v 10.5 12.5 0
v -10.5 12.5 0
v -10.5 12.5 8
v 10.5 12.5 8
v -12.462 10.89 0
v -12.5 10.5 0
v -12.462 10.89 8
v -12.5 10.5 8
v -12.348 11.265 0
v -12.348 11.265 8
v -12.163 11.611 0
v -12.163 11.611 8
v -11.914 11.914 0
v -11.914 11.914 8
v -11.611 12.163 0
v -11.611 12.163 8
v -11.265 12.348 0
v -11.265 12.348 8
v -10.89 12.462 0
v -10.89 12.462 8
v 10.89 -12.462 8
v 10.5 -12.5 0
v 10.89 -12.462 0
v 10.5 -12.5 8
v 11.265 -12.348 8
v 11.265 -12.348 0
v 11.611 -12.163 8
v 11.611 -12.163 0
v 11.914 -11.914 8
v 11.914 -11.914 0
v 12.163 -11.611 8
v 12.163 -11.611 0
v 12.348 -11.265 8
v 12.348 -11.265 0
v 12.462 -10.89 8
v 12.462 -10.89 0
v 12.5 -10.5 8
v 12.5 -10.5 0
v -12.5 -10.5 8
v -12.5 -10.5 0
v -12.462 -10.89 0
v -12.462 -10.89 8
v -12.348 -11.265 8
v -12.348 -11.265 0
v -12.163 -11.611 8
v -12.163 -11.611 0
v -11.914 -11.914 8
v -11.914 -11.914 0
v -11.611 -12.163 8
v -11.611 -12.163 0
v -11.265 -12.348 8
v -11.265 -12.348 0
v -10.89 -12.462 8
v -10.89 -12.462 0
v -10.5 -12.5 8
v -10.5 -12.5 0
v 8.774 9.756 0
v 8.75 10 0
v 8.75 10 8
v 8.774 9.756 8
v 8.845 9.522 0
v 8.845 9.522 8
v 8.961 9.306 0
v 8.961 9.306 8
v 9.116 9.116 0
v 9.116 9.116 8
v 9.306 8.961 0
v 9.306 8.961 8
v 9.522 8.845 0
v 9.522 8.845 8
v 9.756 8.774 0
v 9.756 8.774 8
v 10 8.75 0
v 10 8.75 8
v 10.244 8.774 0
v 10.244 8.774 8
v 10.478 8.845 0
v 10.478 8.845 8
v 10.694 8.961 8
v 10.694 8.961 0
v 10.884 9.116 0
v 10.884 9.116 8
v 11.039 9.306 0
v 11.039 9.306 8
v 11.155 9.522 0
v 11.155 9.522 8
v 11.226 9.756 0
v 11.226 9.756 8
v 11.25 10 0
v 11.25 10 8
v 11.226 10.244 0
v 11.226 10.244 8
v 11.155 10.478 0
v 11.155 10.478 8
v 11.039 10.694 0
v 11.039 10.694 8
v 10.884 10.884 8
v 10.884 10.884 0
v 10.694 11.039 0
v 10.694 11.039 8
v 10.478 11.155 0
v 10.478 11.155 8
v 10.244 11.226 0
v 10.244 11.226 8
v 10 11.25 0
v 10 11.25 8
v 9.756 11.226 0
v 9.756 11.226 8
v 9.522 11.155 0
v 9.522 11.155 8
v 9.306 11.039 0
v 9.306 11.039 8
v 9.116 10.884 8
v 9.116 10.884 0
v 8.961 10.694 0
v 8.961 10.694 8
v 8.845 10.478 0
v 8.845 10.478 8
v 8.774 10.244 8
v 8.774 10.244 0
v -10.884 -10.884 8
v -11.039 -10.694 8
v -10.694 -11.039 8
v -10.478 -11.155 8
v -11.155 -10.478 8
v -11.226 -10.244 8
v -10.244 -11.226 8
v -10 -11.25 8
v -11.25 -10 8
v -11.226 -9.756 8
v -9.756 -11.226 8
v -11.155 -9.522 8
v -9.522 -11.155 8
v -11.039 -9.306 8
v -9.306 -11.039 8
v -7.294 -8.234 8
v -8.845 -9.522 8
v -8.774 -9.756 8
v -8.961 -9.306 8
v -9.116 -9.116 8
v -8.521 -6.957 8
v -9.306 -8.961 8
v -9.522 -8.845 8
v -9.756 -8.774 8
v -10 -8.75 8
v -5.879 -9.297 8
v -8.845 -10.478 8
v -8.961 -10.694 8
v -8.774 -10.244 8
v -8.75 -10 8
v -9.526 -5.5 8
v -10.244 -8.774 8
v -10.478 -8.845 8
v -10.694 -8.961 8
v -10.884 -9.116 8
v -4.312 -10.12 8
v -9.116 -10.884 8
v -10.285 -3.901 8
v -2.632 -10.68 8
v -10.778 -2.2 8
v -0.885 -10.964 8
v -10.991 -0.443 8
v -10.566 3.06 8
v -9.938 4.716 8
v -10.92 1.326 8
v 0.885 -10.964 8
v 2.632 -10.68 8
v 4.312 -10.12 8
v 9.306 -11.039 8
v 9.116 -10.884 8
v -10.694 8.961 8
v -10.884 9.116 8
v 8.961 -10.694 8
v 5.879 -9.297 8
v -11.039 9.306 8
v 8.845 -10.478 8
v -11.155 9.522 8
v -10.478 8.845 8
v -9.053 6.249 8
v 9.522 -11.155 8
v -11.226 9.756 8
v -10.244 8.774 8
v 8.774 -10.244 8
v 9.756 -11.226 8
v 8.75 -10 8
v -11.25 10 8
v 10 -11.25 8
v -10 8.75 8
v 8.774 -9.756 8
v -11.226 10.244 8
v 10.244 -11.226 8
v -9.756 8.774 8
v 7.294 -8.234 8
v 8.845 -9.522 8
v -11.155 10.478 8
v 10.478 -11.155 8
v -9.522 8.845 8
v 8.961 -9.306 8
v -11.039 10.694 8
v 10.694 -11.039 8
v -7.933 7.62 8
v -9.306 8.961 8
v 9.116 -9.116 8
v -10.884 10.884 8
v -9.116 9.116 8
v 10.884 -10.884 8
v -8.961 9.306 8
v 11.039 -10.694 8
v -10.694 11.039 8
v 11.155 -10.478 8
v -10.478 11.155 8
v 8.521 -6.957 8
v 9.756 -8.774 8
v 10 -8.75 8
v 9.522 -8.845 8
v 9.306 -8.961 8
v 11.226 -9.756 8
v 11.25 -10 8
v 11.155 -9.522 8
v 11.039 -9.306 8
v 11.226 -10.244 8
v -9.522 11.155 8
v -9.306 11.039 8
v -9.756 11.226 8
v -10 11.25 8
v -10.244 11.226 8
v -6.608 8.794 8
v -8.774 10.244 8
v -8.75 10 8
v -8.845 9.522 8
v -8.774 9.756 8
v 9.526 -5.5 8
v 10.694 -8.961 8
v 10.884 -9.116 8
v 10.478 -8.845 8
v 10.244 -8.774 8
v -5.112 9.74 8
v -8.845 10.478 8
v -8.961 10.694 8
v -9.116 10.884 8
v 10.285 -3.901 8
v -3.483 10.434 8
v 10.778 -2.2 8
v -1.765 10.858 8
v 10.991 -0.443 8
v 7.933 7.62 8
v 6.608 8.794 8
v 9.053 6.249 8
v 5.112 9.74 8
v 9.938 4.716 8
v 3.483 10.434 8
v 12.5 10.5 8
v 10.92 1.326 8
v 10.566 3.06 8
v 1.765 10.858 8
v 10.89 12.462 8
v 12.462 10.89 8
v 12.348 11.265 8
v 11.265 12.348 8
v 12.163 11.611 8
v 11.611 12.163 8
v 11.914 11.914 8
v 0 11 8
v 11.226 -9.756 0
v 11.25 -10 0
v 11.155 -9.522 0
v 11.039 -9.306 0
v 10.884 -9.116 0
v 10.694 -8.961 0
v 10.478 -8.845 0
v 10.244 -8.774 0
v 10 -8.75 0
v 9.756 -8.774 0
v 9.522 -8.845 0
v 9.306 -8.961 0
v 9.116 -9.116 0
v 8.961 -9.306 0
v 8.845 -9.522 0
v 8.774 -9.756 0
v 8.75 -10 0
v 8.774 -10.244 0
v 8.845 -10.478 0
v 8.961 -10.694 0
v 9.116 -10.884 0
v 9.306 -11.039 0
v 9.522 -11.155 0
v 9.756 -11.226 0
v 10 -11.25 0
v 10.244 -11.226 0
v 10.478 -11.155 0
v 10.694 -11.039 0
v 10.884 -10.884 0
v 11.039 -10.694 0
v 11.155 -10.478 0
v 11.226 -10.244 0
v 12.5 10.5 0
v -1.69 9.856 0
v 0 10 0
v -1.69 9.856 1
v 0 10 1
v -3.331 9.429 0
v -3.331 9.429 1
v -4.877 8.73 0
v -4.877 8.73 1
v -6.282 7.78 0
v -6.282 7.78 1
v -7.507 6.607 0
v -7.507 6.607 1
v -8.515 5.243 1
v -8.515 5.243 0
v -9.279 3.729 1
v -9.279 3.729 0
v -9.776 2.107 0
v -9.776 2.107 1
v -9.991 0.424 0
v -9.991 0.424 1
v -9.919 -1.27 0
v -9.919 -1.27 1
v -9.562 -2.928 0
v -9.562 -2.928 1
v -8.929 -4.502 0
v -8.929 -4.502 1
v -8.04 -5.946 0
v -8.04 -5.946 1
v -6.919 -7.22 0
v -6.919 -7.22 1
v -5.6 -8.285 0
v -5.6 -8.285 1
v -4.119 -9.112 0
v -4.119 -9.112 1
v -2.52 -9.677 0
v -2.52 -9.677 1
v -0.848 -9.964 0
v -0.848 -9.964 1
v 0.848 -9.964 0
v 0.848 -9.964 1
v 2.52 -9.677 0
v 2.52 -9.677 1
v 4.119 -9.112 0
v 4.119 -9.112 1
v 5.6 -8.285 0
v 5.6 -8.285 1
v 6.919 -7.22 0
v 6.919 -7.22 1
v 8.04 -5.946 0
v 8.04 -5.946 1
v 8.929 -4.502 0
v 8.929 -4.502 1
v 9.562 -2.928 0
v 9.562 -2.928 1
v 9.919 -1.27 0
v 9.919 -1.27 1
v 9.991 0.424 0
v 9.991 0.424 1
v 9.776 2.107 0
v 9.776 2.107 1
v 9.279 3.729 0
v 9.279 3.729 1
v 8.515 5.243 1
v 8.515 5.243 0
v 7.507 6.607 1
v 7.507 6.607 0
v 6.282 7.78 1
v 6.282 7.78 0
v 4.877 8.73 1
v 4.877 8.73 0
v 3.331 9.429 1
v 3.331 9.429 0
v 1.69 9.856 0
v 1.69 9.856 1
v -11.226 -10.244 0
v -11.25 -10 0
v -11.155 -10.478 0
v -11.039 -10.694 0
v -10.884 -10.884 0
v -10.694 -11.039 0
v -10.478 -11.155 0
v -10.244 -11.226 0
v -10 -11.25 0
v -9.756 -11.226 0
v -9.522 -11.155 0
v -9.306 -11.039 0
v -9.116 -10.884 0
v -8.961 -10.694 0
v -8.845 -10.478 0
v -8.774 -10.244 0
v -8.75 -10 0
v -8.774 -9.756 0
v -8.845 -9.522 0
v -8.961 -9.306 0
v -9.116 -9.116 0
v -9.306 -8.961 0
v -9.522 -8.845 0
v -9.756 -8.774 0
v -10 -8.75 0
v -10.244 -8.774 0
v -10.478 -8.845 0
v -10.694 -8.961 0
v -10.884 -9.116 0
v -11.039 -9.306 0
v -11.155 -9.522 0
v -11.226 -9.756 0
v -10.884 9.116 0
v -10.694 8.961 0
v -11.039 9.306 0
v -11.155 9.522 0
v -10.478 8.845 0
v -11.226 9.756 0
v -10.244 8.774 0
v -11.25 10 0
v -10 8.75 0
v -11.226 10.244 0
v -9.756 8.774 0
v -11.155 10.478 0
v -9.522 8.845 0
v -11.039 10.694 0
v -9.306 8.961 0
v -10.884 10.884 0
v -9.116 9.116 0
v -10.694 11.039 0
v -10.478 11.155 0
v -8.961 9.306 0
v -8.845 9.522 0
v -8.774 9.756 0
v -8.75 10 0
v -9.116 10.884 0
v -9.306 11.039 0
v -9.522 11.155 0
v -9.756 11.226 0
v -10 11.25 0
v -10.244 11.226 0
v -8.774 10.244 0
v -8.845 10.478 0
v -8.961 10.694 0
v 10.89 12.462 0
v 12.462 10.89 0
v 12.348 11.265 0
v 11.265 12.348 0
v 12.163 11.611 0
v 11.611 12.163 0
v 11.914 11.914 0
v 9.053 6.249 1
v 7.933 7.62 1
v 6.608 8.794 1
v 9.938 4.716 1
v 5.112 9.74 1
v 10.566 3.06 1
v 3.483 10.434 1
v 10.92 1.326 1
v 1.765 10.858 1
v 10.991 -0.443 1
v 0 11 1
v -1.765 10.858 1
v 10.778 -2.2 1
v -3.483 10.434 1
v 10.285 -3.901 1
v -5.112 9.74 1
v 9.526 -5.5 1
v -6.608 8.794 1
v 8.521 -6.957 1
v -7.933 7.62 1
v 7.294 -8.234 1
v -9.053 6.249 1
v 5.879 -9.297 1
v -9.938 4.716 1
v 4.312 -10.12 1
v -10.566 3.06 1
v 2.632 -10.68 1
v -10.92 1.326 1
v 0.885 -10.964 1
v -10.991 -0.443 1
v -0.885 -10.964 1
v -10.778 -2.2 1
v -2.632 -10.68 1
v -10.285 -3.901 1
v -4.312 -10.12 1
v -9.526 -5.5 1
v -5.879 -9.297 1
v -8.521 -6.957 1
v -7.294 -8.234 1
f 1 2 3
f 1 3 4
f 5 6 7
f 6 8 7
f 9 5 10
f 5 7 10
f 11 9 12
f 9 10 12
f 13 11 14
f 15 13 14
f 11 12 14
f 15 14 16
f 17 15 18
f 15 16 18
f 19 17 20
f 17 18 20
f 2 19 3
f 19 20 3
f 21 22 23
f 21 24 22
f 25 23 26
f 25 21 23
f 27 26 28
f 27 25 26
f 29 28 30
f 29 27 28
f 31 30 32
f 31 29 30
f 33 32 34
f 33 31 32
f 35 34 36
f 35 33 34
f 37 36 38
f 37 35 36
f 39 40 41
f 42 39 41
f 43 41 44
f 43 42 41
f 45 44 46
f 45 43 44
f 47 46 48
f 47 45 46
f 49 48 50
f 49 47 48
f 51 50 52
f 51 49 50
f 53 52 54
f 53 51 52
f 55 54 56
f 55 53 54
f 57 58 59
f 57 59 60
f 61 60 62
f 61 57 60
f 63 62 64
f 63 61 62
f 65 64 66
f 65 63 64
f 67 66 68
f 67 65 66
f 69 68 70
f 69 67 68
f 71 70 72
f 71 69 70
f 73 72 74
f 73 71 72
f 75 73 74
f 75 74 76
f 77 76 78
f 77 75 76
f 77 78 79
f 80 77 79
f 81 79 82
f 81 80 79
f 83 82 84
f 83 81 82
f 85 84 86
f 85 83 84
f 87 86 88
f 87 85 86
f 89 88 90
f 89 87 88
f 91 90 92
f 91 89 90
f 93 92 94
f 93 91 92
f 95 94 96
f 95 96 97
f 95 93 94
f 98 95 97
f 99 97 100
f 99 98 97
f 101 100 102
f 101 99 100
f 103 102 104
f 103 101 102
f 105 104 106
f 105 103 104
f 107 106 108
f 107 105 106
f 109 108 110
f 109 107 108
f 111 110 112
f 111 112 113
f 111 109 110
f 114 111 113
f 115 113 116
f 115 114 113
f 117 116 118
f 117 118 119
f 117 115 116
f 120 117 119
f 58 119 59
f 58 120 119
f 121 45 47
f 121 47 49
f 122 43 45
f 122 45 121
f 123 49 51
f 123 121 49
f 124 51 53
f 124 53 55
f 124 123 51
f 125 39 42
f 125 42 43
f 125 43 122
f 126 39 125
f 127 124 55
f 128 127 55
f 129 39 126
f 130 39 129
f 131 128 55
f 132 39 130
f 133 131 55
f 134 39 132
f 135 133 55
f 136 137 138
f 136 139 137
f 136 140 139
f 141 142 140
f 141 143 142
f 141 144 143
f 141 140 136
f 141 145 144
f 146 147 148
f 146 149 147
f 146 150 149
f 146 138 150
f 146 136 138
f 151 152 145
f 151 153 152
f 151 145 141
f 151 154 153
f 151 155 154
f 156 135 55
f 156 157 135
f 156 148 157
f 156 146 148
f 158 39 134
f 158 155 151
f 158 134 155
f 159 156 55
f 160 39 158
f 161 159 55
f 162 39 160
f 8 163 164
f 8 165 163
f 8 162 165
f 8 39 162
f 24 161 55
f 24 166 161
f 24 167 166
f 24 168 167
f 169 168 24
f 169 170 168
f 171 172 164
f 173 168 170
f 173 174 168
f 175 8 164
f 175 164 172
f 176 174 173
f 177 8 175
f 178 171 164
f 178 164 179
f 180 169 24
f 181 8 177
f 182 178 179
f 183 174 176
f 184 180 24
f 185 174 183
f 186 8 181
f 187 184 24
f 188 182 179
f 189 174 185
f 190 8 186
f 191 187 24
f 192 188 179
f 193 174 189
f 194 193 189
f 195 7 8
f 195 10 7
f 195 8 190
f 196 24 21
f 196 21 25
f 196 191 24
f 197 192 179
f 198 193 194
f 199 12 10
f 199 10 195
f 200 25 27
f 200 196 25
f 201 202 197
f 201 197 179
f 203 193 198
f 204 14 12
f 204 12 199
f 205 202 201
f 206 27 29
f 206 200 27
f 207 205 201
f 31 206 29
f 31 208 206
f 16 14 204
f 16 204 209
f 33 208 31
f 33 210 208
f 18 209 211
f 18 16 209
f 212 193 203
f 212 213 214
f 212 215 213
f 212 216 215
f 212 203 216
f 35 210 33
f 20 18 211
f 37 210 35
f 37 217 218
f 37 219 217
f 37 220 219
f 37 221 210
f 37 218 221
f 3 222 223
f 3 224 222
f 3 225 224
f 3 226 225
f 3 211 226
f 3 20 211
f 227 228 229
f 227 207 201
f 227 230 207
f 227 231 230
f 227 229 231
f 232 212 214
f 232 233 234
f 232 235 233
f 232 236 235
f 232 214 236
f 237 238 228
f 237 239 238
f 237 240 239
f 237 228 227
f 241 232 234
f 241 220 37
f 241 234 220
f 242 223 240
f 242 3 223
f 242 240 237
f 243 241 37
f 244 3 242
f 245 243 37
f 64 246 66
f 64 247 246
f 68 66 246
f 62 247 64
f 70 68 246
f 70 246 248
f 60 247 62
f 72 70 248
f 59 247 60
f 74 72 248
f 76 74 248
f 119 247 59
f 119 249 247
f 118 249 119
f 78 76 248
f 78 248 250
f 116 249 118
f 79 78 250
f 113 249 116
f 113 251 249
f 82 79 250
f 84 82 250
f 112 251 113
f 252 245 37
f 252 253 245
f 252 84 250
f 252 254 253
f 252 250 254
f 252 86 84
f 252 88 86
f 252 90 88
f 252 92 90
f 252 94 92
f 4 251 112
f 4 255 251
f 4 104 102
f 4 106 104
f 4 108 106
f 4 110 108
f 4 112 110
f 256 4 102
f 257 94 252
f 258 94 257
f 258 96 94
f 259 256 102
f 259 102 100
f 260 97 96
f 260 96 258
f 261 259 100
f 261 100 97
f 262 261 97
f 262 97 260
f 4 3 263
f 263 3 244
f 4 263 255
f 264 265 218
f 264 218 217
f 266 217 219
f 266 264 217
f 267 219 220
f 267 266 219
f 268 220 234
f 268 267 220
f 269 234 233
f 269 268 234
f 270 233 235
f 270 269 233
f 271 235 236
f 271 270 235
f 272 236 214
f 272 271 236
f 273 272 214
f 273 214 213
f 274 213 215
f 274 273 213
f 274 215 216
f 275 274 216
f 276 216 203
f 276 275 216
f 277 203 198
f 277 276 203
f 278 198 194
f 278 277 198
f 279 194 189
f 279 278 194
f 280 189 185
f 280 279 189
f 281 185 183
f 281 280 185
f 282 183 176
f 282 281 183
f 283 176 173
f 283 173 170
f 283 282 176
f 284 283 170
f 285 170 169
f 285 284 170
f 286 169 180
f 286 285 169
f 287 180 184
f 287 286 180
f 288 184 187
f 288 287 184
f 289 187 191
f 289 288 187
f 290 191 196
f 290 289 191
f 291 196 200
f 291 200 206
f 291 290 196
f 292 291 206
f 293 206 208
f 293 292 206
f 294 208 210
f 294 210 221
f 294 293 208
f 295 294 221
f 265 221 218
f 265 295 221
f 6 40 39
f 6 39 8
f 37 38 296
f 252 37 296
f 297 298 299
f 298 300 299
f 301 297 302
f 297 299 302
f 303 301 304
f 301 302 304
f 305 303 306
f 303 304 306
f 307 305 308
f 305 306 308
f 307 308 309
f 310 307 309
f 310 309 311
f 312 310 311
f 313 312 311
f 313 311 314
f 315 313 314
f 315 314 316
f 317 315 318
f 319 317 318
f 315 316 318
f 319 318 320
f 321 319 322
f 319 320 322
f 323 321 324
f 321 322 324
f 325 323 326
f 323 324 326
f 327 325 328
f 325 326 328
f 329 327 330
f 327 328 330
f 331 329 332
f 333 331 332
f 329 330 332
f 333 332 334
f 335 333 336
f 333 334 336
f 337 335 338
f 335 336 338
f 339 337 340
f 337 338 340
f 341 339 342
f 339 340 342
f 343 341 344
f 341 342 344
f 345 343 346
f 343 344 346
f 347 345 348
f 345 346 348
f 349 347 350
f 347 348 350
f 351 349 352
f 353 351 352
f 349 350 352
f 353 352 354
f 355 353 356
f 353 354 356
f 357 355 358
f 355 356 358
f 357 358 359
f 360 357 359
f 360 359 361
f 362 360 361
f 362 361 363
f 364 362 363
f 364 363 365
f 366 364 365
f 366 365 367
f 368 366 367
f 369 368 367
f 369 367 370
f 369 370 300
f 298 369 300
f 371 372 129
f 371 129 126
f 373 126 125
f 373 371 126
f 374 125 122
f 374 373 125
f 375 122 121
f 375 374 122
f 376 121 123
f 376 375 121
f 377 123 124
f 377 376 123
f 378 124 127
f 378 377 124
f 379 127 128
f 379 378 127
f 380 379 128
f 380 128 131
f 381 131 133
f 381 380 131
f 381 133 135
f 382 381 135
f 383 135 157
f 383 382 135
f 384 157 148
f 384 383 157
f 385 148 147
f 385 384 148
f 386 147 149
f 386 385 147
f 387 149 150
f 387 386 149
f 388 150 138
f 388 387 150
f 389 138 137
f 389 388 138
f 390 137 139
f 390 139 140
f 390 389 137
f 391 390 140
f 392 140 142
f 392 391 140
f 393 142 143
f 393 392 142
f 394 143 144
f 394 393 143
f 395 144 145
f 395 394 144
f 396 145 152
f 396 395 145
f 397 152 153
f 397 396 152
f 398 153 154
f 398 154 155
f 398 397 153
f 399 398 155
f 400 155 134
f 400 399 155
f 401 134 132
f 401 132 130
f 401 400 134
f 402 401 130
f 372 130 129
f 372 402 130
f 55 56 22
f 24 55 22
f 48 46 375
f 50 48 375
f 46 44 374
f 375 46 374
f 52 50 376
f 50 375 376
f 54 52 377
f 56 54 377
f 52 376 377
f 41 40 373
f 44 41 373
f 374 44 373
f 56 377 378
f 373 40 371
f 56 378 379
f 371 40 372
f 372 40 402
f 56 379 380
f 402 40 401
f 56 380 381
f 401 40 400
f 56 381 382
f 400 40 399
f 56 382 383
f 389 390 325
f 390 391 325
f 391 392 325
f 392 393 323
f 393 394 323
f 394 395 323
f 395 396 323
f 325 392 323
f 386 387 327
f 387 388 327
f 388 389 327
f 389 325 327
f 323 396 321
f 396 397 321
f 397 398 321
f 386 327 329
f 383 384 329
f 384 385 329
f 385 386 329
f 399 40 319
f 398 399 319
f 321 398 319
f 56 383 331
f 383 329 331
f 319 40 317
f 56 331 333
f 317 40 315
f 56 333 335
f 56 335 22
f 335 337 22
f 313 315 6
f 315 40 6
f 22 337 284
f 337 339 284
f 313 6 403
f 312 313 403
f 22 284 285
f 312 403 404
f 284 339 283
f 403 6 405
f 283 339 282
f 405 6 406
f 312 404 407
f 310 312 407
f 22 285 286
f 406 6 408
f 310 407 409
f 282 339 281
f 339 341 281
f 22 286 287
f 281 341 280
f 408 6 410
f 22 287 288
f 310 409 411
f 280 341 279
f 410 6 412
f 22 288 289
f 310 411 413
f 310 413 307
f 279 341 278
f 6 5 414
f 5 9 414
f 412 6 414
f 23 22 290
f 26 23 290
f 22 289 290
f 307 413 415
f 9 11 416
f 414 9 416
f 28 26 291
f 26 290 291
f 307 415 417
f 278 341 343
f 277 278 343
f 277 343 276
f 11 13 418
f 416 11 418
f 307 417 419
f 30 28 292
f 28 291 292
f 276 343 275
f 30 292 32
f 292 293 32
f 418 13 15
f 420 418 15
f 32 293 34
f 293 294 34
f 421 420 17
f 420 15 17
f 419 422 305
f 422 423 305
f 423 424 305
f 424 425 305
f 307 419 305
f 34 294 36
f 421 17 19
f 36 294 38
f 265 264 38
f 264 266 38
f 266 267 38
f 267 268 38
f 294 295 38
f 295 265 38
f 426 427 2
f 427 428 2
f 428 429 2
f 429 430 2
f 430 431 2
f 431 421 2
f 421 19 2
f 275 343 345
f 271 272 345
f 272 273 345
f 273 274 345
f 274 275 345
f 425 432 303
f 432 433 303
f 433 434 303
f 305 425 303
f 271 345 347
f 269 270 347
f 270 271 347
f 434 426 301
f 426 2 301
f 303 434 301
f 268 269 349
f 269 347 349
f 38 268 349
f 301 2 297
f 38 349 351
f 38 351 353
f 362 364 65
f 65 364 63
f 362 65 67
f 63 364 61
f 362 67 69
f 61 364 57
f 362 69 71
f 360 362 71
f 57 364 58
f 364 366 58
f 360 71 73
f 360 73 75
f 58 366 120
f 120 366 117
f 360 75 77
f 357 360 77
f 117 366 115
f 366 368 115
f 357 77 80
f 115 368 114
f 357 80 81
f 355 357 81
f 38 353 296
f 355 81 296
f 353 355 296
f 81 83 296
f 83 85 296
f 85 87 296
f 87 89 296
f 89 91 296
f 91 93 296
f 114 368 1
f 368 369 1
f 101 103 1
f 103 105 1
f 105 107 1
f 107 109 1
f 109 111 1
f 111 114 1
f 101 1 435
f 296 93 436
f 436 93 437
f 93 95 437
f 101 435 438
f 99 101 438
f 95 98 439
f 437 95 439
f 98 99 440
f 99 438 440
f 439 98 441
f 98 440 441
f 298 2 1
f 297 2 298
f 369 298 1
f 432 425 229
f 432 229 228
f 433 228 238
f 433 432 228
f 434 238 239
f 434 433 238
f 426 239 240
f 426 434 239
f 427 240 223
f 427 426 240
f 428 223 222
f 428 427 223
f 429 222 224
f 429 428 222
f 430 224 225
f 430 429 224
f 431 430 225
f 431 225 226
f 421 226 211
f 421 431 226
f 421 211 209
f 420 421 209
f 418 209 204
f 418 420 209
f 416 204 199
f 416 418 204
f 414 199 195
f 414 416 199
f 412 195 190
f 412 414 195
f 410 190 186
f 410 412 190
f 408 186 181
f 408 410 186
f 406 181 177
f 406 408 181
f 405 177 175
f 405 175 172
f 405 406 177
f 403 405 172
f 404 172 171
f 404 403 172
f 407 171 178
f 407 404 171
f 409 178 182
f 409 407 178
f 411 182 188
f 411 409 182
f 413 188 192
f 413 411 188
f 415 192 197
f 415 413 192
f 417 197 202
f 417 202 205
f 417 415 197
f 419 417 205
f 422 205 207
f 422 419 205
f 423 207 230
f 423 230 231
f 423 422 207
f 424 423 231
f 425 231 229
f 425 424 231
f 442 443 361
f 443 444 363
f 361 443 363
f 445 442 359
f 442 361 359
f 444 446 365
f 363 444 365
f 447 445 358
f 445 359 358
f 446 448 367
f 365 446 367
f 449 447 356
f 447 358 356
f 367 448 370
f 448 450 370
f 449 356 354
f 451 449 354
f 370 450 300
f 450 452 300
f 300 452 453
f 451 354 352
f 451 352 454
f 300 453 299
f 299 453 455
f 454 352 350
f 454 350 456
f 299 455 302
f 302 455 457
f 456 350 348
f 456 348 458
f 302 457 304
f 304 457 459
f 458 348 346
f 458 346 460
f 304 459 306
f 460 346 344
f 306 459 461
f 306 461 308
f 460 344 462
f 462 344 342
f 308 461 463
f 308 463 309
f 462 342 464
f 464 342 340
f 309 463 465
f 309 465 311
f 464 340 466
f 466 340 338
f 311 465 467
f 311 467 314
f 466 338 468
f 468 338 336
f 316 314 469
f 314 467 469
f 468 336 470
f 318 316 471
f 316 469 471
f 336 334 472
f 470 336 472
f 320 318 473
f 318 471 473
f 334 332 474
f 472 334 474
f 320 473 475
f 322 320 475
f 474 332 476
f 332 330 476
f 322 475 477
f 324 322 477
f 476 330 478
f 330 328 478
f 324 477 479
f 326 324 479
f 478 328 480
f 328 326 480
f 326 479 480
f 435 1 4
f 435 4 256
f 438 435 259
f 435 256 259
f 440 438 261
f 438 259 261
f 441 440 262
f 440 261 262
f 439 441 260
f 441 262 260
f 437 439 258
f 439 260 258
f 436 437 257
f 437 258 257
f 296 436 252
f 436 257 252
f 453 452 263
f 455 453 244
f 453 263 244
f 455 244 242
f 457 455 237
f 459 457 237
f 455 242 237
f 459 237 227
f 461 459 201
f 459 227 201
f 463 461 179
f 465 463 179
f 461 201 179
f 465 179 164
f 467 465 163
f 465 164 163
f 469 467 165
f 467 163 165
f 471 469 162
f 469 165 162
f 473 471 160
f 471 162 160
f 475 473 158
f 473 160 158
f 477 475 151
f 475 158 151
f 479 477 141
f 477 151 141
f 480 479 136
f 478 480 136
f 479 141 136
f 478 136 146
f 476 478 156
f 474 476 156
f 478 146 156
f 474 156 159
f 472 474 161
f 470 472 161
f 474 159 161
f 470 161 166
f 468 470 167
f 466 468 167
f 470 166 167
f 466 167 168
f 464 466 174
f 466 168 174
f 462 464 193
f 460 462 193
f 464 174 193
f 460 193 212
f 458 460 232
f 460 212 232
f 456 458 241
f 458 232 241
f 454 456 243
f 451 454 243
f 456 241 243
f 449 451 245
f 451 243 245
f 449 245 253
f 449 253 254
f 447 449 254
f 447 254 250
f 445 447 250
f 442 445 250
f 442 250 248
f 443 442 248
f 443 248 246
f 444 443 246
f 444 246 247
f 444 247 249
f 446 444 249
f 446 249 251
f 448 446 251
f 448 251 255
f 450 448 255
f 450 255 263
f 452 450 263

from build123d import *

# Parameters (mm, degrees)
ESQUISSE1_W        = 25
ESQUISSE1_H        = 25
ESQUISSE1_R        = 1.25
BOSS_EXTRU_1_DEPTH = 8
CONG_1_R           = 2


with BuildPart() as part:
    # Esquisse1 → Boss.-Extru.1 (new body)
    with BuildSketch(Plane.XY):
        Rectangle(ESQUISSE1_W, ESQUISSE1_H)
        with Locations((-10, 10)):
            Circle(ESQUISSE1_R, mode=Mode.SUBTRACT)
        with Locations(Location((10, 10, 0), (0, 0, 180))):
            Circle(ESQUISSE1_R, mode=Mode.SUBTRACT)
        with Locations((10, -10)):
            Circle(ESQUISSE1_R, mode=Mode.SUBTRACT)
        with Locations(Location((-10, -10, 0), (0, 0, 180))):
            Circle(ESQUISSE1_R, mode=Mode.SUBTRACT)
    extrude(amount=BOSS_EXTRU_1_DEPTH)

    # Esquisse2 → Enlèvement de matière-Révolution1 (revolve, cut)
    with BuildSketch(Plane(origin=(0, 0, 0), x_dir=(0, 0, -1), z_dir=(1, 0, 0))):
        Polygon((-8, 0), (0, 0), (0, 10), (-1, 10), (-1, 11), (-8, 11), align=None)
    revolve(axis=Axis((0, 0, 8), (0, 0, 1)), mode=Mode.SUBTRACT)

    # Congé1
    cong_1_edges = [part.edges().sort_by_distance(p)[0] for p in [
        (-12.5, 12.5, 4),
        (12.5, 12.5, 4),
        (12.5, -12.5, 4),
        (-12.5, -12.5, 4),
    ]]
    fillet(cong_1_edges, radius=CONG_1_R)


solid = part.part
